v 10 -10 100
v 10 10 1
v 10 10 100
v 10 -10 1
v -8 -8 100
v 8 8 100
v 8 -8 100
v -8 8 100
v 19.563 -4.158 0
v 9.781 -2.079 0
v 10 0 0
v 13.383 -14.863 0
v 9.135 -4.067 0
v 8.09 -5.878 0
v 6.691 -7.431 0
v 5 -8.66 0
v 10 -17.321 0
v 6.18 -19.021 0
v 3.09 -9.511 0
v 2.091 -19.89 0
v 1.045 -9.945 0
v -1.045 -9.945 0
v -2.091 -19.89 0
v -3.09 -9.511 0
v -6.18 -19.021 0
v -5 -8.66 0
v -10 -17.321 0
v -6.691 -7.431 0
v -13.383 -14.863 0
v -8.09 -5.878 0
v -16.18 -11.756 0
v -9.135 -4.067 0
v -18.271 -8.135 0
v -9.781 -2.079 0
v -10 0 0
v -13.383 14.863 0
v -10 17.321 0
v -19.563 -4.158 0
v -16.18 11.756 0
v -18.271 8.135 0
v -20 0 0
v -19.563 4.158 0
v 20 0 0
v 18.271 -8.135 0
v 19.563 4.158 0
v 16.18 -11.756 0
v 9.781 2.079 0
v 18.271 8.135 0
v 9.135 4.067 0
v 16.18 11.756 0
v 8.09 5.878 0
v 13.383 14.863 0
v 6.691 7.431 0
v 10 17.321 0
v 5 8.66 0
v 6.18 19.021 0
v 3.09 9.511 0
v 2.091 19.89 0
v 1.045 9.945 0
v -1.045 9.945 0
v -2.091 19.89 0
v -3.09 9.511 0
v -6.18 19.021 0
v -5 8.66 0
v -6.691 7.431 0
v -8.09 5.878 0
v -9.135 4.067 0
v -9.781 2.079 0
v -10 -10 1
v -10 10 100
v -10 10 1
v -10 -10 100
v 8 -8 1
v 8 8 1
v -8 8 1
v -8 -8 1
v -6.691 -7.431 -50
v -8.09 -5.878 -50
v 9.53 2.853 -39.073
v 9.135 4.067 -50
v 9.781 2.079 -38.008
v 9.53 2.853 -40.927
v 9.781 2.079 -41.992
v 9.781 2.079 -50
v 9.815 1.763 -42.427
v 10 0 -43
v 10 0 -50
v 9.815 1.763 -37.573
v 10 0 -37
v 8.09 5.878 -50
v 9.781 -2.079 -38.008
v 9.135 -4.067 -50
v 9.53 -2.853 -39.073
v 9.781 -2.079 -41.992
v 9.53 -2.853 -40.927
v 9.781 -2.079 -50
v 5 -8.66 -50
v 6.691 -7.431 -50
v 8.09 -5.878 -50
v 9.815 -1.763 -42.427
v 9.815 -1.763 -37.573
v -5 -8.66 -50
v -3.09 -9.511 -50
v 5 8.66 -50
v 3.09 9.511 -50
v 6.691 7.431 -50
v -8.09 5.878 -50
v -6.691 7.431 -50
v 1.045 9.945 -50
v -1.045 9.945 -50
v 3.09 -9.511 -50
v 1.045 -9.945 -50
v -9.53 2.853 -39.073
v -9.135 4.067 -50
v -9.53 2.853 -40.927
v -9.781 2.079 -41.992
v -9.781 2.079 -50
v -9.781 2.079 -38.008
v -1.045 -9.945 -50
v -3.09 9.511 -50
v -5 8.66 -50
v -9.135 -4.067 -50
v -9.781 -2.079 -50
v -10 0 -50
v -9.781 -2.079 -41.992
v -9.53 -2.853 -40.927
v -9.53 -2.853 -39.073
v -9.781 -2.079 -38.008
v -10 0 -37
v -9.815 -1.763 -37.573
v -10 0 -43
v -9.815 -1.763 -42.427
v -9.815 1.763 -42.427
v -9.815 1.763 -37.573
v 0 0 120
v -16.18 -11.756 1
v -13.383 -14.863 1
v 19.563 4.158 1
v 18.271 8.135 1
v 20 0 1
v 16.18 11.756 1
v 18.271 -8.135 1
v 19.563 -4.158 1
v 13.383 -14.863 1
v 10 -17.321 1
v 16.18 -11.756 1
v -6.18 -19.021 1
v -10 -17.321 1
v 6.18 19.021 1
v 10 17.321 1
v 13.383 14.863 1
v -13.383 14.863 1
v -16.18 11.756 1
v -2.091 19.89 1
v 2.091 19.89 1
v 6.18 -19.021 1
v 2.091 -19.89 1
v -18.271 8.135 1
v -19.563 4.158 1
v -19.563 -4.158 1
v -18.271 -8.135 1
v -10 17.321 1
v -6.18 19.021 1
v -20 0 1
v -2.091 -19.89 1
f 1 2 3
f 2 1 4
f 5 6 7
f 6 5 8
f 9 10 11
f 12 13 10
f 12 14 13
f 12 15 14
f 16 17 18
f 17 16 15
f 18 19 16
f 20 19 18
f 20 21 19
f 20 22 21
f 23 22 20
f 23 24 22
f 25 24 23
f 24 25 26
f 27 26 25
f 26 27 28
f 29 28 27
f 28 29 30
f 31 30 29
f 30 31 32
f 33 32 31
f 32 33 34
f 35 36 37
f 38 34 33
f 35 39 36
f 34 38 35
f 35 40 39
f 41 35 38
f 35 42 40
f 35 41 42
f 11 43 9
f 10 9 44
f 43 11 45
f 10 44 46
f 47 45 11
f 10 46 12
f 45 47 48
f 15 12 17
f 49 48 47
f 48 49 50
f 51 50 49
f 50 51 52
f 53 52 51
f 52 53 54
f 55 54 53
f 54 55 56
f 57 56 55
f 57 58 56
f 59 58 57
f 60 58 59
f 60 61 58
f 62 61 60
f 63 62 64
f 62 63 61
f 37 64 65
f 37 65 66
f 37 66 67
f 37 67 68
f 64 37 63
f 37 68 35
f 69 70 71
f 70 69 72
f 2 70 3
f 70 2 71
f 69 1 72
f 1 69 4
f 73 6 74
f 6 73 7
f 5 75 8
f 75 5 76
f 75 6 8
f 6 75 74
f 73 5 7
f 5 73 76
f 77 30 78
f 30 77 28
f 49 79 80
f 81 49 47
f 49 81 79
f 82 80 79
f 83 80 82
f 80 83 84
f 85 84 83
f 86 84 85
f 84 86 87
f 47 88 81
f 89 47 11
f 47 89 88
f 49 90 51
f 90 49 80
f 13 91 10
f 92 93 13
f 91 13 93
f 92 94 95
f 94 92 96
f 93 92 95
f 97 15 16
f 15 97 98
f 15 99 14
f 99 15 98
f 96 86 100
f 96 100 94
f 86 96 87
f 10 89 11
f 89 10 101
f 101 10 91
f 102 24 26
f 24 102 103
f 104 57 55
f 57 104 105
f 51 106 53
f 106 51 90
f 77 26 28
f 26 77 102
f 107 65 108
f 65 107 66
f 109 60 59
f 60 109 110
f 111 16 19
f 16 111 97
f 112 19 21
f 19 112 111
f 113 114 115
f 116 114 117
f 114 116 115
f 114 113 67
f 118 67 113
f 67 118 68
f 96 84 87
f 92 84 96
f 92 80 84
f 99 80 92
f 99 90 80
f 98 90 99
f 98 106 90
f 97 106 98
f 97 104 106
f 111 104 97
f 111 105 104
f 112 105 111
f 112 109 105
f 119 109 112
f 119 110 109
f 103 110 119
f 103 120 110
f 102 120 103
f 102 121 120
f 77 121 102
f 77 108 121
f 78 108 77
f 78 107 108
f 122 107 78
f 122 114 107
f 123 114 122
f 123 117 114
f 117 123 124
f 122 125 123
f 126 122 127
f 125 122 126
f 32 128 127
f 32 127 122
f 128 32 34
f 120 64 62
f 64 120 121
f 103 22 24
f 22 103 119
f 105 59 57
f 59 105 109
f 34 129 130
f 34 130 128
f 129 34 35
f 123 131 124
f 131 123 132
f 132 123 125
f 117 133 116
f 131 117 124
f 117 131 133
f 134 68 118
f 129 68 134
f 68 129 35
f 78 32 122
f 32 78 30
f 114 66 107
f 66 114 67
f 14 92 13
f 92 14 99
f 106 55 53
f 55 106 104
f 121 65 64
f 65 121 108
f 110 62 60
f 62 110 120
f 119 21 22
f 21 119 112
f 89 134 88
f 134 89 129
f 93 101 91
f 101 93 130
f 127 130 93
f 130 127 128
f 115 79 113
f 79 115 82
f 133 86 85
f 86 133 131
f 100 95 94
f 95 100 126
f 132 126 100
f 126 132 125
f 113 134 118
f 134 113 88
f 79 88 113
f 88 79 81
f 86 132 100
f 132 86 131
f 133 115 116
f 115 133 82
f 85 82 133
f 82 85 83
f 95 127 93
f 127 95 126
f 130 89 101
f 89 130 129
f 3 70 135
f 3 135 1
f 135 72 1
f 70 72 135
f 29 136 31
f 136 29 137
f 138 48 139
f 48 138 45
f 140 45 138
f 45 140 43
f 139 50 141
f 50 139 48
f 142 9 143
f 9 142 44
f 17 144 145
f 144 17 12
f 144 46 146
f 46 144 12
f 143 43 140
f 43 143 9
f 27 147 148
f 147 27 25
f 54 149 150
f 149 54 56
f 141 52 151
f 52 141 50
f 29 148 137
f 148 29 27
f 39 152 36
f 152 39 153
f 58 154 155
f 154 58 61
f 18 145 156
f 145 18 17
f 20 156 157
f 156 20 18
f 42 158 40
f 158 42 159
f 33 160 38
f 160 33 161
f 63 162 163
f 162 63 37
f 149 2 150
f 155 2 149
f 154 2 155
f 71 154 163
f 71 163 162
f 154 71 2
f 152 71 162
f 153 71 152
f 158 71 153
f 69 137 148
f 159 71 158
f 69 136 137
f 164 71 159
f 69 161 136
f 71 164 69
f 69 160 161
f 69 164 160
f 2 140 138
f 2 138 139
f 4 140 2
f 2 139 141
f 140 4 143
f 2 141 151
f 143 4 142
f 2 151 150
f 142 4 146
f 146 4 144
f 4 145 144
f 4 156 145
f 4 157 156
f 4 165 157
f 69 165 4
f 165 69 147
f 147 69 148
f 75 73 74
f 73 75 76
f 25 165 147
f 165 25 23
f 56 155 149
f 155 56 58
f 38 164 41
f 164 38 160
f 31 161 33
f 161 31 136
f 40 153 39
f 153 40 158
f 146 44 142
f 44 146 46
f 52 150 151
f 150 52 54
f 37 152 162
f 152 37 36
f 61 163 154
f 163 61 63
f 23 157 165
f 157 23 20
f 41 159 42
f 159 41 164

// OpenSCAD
difference(){

translate([0, 0, 50])
cube([20, 20, 100], center = true);

translate([0,0, 50])
cube([16, 16, 100], center = true);
}

// Define base dimensions and height
base_length = 20;
base_width = 20; // Adjust width if needed for a rectangular base
height = 20;


translate([0, 0, 100])
// Create rectangular pyramid
linear_extrude(height = height, scale = 0)
    polygon(points = [[-base_length/2, -base_width/2], [base_length/2, -base_width/2], [base_length/2, base_width/2], [-base_length/2, base_width/2]]);
    
cylinder(height=30, r=20);    


difference() {
 

translate([0,0,-50])
cylinder(h=50, r=10);
    
translate([-30,0, -40])
rotate([0, 90, 0])
cylinder(h=60, r= 3);
}
